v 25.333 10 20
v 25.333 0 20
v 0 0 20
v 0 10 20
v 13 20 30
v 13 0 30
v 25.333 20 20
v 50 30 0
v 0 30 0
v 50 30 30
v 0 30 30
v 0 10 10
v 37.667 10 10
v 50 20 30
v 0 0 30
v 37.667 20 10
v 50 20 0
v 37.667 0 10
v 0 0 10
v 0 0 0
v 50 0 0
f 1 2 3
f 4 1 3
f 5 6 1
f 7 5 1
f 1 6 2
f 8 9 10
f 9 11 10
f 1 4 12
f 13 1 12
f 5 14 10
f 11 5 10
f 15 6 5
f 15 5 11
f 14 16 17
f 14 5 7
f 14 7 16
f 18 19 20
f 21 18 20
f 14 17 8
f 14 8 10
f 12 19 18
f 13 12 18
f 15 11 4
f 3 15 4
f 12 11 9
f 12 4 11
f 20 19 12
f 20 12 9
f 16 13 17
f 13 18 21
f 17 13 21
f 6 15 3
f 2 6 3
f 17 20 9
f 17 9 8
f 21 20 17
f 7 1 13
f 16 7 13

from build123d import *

# Parameters (mm, degrees)
F1_DEPTH = 30
F2_DEPTH = 20
F3_DEPTH = 10


with BuildPart() as f1:
    # F0 (on Front) → F1 (new body)
    with BuildSketch(Plane.XZ):
        Polygon((0, 10), (0, 0), (50, 0), (37.666667, 10), align=None)
        Polygon((37.666667, 10), (50, 0), (50, 30), (13, 30), (25.333333, 20), align=None)
        Polygon((0, 20), (0, 10), (37.666667, 10), (25.333333, 20), align=None)
        Polygon((0, 30), (0, 20), (25.333333, 20), (13, 30), align=None)
    extrude(amount=-F1_DEPTH)

    # F0 (on Front) → F2 (cut)
    with BuildSketch(Plane.XZ):
        Polygon((37.666667, 10), (50, 0), (50, 30), (13, 30), (25.333333, 20), align=None)
    extrude(amount=-F2_DEPTH, mode=Mode.SUBTRACT)

    # F0 (on Front) → F3 (cut)
    with BuildSketch(Plane.XZ):
        Polygon((0, 20), (0, 10), (37.666667, 10), (25.333333, 20), align=None)
    extrude(amount=-F3_DEPTH, mode=Mode.SUBTRACT)


solid = f1.part
